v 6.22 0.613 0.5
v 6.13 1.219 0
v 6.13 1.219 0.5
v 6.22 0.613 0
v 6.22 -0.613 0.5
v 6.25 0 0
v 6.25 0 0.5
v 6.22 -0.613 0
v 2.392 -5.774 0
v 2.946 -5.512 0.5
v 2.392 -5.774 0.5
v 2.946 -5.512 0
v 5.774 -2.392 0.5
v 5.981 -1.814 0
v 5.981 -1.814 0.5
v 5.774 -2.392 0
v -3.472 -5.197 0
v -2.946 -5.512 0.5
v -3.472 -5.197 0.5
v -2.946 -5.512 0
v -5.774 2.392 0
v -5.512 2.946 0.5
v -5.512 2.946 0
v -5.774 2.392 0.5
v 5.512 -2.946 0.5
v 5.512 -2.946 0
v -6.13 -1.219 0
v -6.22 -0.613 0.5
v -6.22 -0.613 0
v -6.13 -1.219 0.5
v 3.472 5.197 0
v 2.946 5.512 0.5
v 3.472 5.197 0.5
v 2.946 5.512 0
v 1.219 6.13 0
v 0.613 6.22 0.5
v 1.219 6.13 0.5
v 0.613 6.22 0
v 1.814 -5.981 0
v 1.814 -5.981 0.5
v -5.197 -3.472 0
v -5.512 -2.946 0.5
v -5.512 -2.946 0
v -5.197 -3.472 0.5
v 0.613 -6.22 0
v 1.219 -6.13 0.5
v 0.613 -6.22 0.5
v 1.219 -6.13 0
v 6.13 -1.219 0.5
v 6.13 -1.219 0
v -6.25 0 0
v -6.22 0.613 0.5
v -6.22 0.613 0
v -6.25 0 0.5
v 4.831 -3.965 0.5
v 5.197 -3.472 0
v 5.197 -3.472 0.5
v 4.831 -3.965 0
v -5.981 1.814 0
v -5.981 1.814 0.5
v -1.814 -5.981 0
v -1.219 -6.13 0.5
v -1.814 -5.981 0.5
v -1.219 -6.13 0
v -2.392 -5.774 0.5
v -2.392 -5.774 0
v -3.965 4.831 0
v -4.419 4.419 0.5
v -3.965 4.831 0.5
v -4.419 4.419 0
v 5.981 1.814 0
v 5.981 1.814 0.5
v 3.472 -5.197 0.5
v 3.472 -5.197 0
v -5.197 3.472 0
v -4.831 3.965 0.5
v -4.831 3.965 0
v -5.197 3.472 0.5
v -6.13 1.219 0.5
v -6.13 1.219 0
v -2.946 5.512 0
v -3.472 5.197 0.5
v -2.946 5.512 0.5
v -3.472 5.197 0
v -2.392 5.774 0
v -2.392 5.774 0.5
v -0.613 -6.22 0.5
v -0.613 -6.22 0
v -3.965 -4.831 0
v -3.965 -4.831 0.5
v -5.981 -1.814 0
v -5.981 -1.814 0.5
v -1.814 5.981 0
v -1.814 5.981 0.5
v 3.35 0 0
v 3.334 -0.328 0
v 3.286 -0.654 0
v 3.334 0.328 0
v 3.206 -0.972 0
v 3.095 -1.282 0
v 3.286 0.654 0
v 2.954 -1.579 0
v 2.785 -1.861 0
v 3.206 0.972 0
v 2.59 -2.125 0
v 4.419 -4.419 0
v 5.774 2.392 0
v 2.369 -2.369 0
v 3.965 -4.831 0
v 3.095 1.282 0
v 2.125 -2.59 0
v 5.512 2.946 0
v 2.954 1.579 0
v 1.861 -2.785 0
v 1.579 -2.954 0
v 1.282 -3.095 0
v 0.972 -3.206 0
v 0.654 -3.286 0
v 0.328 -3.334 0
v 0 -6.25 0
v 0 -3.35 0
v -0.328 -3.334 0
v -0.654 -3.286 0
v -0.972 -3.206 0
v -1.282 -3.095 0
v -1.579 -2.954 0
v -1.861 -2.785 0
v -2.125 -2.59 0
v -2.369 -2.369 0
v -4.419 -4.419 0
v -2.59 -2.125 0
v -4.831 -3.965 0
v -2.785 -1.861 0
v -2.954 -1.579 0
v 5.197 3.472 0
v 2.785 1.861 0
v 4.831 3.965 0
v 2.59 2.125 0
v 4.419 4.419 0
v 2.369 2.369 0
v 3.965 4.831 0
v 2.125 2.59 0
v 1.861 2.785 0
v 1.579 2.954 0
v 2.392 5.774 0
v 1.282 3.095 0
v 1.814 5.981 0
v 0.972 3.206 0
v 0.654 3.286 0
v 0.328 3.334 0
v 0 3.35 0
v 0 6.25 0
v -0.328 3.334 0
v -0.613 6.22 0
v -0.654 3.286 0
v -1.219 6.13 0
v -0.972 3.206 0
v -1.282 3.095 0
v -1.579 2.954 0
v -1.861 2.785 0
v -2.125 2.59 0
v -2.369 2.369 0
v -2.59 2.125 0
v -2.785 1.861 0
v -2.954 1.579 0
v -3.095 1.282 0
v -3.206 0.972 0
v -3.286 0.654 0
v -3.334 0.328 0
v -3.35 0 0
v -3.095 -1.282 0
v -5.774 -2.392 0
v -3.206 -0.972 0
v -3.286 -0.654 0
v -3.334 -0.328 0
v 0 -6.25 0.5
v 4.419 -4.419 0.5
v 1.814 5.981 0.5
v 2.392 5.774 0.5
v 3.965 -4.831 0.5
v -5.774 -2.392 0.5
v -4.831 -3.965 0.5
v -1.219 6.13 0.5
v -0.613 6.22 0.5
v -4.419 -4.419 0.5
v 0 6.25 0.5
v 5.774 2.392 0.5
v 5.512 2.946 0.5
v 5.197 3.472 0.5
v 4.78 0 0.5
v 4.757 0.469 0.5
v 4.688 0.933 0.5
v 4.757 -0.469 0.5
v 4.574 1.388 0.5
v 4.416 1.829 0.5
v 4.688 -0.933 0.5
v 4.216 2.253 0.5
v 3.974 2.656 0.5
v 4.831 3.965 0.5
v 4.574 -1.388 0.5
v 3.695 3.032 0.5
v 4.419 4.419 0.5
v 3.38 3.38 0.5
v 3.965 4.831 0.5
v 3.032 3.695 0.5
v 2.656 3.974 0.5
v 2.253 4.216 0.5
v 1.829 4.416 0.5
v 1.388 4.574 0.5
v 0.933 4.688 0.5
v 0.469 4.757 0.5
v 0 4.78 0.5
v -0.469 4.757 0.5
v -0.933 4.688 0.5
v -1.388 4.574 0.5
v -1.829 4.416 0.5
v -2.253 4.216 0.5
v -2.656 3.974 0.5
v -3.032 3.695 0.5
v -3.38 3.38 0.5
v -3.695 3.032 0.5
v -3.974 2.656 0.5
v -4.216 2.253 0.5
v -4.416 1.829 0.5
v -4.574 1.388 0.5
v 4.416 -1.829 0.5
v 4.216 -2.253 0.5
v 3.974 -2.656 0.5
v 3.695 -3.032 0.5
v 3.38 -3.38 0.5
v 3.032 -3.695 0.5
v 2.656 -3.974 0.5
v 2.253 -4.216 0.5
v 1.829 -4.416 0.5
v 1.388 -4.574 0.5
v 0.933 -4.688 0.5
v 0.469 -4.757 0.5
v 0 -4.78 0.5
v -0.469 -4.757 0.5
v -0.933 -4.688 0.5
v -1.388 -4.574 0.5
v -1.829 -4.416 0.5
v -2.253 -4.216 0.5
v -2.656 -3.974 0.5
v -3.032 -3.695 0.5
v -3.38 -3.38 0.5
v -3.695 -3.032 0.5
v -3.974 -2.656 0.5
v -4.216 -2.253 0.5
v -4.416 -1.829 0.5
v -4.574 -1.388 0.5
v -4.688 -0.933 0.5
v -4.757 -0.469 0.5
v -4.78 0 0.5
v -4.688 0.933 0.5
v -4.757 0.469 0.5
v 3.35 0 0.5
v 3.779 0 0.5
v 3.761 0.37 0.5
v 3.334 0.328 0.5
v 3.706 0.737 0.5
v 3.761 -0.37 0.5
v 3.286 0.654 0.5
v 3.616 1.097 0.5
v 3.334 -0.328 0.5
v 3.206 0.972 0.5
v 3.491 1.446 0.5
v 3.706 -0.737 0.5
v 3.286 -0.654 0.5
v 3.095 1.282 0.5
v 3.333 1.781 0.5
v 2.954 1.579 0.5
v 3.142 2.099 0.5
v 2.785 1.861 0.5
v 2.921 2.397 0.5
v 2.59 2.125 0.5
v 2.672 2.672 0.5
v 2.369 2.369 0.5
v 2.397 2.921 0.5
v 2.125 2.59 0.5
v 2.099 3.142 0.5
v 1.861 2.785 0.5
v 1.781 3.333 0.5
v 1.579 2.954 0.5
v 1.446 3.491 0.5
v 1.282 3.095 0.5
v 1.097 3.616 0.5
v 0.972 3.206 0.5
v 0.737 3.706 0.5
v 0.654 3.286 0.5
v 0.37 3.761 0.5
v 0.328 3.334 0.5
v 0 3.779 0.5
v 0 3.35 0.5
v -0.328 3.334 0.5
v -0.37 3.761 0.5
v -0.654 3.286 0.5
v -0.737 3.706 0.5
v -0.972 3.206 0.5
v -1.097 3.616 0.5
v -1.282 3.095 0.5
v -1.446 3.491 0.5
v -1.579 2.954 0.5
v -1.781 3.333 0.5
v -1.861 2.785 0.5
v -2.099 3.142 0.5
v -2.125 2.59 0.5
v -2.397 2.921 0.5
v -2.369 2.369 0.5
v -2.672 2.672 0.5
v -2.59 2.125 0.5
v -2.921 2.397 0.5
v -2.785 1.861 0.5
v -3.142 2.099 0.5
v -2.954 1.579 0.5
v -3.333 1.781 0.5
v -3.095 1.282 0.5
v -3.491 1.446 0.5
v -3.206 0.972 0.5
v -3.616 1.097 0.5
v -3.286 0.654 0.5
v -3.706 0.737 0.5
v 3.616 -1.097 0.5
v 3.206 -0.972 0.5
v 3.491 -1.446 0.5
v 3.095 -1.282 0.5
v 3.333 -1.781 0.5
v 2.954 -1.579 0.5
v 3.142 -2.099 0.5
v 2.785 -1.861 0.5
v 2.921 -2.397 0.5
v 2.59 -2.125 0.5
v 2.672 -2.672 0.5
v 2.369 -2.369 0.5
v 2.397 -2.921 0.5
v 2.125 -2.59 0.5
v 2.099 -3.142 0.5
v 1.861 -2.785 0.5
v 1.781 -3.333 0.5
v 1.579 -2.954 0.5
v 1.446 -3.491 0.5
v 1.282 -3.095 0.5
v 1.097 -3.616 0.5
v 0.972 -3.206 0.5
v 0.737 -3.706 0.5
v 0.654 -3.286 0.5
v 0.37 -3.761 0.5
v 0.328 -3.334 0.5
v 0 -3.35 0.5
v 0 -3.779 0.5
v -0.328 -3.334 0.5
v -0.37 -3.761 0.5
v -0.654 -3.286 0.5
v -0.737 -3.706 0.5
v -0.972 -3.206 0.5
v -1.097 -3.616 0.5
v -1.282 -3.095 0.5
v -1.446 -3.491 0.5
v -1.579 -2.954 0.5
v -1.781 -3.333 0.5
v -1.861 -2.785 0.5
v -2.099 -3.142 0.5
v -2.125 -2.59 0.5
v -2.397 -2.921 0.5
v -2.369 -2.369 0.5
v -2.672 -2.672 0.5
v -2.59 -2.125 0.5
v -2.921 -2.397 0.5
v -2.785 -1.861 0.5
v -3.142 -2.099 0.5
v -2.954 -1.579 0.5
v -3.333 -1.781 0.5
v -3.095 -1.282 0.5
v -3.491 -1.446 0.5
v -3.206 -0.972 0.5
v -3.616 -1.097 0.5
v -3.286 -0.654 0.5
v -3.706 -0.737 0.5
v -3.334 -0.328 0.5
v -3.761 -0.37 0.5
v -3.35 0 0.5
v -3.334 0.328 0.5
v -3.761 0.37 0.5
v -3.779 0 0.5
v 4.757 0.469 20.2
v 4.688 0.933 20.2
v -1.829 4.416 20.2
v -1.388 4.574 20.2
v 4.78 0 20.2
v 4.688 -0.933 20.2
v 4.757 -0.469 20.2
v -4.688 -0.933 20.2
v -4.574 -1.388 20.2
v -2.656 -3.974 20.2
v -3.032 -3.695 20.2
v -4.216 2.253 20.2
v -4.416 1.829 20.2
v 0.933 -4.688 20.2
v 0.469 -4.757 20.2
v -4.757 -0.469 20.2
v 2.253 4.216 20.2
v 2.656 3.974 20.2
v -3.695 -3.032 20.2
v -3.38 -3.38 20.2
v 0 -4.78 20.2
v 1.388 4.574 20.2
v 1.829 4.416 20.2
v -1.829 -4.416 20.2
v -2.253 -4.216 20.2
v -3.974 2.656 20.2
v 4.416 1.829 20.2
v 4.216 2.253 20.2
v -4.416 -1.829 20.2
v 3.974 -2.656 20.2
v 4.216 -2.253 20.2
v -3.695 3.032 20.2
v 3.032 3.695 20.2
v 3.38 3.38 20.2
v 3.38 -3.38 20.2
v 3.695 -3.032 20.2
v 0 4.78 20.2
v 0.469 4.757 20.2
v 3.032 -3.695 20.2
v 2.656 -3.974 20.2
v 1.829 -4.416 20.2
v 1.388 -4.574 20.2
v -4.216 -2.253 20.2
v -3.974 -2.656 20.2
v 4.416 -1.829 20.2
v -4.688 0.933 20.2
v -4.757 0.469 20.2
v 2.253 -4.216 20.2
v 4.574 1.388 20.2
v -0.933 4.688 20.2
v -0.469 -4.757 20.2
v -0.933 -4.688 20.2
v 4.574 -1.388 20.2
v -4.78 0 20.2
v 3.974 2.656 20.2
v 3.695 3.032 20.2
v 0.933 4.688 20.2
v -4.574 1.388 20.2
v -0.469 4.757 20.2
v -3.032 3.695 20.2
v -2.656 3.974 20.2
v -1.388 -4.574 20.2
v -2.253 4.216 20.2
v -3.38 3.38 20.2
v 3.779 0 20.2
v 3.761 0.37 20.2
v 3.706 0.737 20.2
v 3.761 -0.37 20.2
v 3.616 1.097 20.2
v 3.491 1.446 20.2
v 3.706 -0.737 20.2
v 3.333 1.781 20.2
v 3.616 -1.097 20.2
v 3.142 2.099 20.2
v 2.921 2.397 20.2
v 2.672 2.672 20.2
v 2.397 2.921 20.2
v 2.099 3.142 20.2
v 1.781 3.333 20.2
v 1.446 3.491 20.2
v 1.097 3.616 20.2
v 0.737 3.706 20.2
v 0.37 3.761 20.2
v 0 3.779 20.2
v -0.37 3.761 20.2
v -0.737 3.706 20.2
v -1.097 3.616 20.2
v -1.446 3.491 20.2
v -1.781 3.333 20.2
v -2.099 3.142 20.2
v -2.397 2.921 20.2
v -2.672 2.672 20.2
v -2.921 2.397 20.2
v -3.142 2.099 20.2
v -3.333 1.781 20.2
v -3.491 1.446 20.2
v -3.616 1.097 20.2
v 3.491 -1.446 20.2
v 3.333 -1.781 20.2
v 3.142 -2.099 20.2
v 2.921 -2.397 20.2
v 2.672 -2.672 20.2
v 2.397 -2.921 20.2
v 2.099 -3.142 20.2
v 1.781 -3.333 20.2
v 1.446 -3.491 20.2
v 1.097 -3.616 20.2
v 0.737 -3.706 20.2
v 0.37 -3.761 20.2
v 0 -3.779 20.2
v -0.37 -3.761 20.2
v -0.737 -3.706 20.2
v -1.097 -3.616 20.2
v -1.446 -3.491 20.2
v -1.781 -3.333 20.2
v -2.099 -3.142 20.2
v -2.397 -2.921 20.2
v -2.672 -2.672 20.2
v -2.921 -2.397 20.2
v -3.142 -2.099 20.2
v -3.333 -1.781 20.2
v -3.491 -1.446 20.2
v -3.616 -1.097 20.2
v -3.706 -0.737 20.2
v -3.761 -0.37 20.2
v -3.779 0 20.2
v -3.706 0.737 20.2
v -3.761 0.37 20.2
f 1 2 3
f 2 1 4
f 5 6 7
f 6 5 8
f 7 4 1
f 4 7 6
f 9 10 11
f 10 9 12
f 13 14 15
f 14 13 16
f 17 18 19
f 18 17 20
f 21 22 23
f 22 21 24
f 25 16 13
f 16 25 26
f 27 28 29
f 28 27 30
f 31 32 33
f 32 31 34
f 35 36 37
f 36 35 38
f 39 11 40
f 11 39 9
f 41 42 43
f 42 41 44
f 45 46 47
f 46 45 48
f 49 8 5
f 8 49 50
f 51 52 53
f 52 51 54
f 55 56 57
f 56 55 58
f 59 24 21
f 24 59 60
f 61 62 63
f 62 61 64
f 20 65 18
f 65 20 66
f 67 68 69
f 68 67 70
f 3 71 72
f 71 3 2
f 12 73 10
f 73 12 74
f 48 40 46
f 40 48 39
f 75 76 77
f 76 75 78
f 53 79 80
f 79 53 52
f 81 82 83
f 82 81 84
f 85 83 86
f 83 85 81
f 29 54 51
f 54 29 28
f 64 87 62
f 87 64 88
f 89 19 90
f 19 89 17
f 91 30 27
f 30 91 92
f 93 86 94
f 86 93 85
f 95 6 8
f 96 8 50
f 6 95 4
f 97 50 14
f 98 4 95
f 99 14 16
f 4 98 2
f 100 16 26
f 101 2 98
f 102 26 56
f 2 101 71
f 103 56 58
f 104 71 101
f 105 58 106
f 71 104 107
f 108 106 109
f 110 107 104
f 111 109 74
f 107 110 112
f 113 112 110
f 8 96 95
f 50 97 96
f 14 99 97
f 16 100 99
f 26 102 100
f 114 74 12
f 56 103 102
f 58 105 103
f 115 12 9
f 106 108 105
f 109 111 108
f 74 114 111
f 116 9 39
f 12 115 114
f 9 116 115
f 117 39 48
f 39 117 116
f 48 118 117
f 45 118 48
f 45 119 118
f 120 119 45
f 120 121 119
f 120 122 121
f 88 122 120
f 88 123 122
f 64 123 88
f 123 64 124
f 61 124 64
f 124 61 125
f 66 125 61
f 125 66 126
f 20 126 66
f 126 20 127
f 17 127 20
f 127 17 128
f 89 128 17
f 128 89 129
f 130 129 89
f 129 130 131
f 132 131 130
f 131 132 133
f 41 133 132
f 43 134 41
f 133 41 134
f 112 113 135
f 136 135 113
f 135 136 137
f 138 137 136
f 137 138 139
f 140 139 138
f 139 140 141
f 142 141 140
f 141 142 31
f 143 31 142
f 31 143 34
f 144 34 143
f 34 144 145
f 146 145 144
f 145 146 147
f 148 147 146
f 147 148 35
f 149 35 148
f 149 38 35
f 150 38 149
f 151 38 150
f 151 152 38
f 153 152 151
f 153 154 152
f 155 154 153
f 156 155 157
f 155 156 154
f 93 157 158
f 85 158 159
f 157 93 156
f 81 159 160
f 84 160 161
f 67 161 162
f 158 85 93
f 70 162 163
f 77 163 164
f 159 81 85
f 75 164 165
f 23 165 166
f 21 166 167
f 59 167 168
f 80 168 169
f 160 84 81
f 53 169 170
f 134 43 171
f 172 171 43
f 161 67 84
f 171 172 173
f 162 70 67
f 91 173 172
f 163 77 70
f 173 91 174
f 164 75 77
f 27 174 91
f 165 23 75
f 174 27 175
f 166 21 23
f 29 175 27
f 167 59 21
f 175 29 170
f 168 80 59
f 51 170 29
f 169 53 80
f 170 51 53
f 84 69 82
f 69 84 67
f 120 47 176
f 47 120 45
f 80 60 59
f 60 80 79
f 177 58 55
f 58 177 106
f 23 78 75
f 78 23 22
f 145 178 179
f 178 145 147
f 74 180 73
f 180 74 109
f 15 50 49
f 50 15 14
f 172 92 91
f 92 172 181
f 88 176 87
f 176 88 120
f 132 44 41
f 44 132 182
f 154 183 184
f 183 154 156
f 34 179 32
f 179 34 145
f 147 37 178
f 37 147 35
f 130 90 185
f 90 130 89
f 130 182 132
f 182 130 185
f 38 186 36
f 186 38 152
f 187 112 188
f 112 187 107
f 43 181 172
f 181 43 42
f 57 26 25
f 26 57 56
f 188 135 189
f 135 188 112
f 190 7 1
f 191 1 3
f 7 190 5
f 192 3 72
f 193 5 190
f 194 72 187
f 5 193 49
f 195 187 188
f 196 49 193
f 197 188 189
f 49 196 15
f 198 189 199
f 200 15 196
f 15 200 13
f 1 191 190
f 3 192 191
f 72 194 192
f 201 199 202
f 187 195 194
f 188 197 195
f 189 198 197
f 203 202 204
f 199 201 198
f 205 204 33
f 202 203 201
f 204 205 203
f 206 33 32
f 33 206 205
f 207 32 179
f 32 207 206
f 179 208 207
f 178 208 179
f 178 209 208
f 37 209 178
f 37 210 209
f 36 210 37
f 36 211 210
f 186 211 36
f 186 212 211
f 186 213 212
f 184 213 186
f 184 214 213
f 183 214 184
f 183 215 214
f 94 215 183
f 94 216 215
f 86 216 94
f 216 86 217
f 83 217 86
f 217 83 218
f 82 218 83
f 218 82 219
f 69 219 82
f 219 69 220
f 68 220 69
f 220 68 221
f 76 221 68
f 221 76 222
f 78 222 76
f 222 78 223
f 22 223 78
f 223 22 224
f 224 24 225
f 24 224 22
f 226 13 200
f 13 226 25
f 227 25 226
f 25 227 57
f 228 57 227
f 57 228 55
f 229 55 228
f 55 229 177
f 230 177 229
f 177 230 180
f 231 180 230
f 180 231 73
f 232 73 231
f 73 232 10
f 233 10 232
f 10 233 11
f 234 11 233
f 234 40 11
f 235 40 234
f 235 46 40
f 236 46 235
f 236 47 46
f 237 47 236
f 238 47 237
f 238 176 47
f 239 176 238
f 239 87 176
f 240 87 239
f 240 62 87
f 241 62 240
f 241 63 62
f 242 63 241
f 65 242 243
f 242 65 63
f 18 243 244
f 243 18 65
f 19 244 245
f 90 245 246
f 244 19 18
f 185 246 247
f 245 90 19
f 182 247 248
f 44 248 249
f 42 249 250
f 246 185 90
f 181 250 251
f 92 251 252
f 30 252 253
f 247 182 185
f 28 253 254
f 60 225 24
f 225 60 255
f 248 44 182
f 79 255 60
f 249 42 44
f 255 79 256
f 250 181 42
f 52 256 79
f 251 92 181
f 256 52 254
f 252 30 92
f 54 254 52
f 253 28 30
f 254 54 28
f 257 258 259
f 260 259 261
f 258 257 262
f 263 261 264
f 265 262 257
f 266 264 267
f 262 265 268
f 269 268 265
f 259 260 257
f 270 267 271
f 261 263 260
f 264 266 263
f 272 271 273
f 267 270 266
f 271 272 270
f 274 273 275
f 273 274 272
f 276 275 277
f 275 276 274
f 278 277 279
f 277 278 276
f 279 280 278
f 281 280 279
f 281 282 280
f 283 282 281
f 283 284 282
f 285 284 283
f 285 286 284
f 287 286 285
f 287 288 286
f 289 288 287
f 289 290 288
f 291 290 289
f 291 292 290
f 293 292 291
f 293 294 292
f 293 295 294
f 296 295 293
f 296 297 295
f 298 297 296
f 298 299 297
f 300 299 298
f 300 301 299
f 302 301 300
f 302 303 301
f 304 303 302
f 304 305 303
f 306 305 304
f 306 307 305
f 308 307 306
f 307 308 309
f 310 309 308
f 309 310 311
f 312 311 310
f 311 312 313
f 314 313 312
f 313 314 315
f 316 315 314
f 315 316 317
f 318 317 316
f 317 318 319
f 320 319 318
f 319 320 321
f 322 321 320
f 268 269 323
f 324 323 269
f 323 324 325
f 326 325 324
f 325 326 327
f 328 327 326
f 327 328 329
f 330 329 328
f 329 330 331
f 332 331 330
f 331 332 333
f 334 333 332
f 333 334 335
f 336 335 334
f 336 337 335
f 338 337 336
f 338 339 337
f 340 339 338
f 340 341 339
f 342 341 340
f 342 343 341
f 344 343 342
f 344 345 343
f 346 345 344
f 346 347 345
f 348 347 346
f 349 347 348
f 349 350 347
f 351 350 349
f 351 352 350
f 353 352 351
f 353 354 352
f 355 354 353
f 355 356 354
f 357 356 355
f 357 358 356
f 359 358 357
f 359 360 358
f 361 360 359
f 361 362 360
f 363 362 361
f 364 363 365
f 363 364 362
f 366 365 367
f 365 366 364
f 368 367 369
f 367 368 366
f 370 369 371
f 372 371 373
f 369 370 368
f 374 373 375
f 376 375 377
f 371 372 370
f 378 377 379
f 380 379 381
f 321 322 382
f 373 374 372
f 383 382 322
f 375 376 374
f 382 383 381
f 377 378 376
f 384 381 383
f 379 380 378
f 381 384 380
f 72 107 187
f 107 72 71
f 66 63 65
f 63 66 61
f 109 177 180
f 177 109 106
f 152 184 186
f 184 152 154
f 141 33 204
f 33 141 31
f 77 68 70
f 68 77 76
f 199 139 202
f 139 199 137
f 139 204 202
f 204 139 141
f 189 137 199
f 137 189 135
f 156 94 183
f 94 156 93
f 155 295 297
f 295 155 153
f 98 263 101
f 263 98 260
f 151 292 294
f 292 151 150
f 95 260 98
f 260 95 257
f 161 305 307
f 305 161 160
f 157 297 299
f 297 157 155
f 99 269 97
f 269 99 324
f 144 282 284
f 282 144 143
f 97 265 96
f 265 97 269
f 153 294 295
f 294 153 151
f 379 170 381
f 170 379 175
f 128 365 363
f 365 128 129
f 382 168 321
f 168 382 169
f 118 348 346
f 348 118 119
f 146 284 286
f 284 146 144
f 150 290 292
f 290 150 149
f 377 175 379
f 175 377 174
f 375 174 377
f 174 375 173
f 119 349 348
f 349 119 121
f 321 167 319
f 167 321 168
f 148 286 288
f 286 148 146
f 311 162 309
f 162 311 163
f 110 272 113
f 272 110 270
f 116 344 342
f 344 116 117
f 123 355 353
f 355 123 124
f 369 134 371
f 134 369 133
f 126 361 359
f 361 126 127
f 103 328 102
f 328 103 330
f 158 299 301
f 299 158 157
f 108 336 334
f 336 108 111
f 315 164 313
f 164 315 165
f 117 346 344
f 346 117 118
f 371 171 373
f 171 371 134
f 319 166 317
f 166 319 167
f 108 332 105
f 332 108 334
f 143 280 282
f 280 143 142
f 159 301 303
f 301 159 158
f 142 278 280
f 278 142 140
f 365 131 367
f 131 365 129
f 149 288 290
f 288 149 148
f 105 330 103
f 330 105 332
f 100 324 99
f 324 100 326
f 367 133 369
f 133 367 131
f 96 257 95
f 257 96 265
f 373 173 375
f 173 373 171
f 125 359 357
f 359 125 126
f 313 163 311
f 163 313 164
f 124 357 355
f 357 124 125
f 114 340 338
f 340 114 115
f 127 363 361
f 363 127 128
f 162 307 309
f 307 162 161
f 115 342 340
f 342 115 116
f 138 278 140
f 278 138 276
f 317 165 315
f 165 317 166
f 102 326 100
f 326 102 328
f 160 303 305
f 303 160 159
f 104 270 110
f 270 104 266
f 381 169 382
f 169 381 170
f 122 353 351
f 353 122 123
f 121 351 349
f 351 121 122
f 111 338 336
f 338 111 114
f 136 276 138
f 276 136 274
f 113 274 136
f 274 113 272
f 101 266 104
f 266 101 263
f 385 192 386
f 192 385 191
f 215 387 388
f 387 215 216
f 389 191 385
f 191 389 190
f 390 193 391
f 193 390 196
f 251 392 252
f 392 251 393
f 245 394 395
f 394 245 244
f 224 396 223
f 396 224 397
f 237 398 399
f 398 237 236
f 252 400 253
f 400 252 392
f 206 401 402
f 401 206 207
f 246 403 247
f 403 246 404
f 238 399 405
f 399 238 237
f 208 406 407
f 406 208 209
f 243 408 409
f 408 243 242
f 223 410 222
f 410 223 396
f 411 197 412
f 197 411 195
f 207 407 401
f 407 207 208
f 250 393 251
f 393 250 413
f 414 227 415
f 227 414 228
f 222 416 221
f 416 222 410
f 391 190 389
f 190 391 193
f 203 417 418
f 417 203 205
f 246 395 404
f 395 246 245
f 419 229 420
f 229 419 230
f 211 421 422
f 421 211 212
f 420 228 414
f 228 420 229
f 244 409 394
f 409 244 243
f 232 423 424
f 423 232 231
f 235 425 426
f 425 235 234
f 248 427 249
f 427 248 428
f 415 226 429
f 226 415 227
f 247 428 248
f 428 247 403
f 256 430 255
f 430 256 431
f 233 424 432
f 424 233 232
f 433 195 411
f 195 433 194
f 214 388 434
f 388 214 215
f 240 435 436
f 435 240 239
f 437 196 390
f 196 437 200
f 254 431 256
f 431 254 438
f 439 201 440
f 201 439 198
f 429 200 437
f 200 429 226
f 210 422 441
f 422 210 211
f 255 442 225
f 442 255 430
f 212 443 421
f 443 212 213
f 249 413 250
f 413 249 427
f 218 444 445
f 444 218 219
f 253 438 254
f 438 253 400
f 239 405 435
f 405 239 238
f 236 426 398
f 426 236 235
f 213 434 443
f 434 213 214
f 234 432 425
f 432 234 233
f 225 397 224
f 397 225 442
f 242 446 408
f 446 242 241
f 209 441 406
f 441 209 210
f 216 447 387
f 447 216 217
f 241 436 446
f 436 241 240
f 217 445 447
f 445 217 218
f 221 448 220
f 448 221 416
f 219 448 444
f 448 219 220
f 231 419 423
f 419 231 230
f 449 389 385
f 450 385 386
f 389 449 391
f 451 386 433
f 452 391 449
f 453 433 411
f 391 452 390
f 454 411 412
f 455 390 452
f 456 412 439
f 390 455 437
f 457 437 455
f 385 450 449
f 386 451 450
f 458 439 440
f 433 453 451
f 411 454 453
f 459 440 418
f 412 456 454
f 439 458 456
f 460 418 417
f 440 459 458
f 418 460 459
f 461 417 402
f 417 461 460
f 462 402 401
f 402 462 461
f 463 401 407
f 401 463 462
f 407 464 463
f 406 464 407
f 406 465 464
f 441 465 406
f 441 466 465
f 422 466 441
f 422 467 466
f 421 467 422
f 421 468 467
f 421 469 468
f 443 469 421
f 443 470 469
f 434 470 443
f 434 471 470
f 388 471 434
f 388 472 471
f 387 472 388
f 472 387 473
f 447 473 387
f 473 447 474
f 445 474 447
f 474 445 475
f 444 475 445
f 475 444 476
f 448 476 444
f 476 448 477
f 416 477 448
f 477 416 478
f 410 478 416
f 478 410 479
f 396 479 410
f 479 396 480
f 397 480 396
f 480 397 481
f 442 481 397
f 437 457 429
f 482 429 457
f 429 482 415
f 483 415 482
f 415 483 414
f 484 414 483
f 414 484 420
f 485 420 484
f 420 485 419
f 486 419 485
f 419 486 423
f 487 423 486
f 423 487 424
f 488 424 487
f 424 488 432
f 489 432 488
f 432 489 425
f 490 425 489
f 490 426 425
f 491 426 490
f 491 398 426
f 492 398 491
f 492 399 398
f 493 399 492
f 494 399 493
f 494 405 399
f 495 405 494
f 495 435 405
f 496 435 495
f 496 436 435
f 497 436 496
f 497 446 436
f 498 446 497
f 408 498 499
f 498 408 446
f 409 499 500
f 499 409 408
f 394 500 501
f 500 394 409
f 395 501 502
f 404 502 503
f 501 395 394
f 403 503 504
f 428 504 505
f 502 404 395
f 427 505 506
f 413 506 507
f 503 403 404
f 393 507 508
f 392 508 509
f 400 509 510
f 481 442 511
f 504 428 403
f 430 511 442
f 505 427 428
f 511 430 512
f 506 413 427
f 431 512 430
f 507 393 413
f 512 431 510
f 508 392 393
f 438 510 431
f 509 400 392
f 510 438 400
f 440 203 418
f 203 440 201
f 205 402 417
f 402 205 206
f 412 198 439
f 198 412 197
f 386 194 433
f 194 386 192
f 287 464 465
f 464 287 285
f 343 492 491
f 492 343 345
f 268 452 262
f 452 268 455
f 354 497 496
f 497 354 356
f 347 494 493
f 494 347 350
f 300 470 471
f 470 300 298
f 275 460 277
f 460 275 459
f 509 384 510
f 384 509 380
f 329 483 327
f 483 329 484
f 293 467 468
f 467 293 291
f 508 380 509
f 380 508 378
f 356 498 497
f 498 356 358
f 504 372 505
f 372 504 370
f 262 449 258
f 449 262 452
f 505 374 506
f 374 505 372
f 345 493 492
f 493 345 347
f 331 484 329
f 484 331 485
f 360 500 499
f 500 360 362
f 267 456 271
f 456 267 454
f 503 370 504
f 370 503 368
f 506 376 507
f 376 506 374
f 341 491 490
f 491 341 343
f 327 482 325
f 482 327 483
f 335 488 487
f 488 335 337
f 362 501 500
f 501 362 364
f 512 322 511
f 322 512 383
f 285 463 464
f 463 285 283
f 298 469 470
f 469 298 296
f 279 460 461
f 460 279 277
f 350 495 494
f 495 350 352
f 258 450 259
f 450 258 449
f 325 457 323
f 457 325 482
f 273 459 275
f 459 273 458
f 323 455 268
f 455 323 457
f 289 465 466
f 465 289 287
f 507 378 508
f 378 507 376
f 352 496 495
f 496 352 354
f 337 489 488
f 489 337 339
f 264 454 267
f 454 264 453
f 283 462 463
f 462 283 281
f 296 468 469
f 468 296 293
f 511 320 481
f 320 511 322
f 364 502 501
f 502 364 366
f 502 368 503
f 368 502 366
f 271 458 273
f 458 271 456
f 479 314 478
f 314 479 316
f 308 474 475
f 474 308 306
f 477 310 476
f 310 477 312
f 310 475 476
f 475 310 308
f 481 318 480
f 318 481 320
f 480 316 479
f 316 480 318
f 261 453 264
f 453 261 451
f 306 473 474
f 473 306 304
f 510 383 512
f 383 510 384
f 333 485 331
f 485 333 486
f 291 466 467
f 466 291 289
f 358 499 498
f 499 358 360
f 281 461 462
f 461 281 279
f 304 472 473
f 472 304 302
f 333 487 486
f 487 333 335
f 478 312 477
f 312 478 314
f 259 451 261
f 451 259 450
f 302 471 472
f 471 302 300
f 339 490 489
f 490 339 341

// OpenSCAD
// 3D Printer Cutter Attachment
// Uses a bearing to venter the cutting tip of the blade
// as the 3D printer moves.

$fn = 64;
blade_len = 11.4; // Base to tip of blade distance
blade_rad = 3.2/2.0; // Radius of cutting blade
blade_angle = 11.5;
blade_holder_lip_len = 0.5;
backstop_len = 1.0; // How much of a backstop the insert
                    // in the bearing has. The blade will
                    // stick out this far:
                    // blade_len - bearing_h + backstop_len

bearing_inner_rad = 9.6/2.0; // Inner circle of bearing
bearing_inner_ring_rad = 12.5/2.0;
bearing_outer_rad = 22.2/2.0; // Outer circle of bearing
bearing_outer_ring_rad = 24.5/2.0;
bearing_outer_ring_h = 1.4;
bearing_h = 7.1;

spring_len = 14.3;
piston_len = 5.0;
cap_len = 2.0;
cylinder_len = spring_len + piston_len;

bearing_block_len = bearing_outer_rad*2.0 + 5.0;
bearing_block_connector_wid = 6.0;

// Ender 3 Pro mounting params
screw_hole_dist=14.4;
screw_hole_dia=3.0;
screw_hole_rad=screw_hole_dia/2;
screw_len = 20;
hotend_vert_dist = 50.0; // (Vertical) Distance from the screwholes to the hotend location
hotend_horiz_dist = 12.0/2.0; // (Horizontal) Distance from screw holes to center of hotend location

gap_size = 0.02;

// The top-down blade
module blade2D() {
    circle(blade_rad+gap_size);
}

// What holds the cutter inside of the bearing
module blade_holder2D() {
    circle(bearing_inner_rad-gap_size);
}

// The block that holds onto the bearing
module bearing_block2D() {
    difference() {
        union() {
        translate([0,bearing_block_len/4.0])
        square([bearing_block_len, bearing_block_len/2.0], center=true);
        circle(bearing_block_len/2.0);
        }
        circle(bearing_outer_rad+gap_size);
    }
}

//bearing_block2D();
//blade_holder2D();

piston_gap_size = 1.1;
module blade_insert3D() {
    difference() {
    translate([0,0,blade_holder_lip_len+0.3])
    linear_extrude(piston_len-blade_holder_lip_len)
    offset(-piston_gap_size-0.06) blade_holder2D();
    translate([1.8*blade_rad+0.2, 0, -blade_rad*4.8])
    rotate([0,blade_angle,180])
    linear_extrude(blade_len)
    blade2D();
    }
}

//blade_insert3D();

module blade_holder3D() {
    // TODO: Add emerging screw holes for a screw-on
    //       cap!
    
    difference() {
    linear_extrude(blade_holder_lip_len)
    circle(bearing_inner_ring_rad);
    linear_extrude(blade_holder_lip_len)
    circle(bearing_inner_rad-(bearing_inner_ring_rad-bearing_inner_rad));
    }
    
    difference() {
    union() {
    translate([0,0,blade_holder_lip_len])
    linear_extrude(cylinder_len+0.4)
    blade_holder2D();
    linear_extrude(blade_holder_lip_len)
    circle(bearing_inner_ring_rad);
    }
    //translate([0,0,4])
    linear_extrude(cylinder_len+4)
    offset(-1.0) blade_holder2D();
    //translate([1.8*blade_rad+0.2, 0, -blade_rad/4.0])
    //rotate([0,blade_angle,180])
    //linear_extrude(blade_len)
    //blade2D();
    }
    //blade_insert3D();
    //translate([0,0,bearing_h-backstop_len])
    //linear_extrude(backstop_len)
    //circle(bearing_inner_rad-gap_size);
}

module screw_holes(extra_wid=0.0, extra_len=0.0) {
    translate([0, screw_len/2, 0])
    rotate([90,0,0]) {
        translate([(screw_hole_dist+extra_wid)/2,0,0])
        cylinder(r=screw_hole_rad, h=screw_len+extra_len);
        translate([-(screw_hole_dist+extra_wid)/2,0,0])
        cylinder(r=screw_hole_rad, h=screw_len+extra_len);
    }
}

module bearing_block3D() {
    linear_extrude(bearing_h-bearing_outer_ring_h)
    bearing_block2D();
}

support_triangle_wid = bearing_block_len/2-(bearing_outer_rad+gap_size);
module support_triangle() {
    rotate([0,-90,0])
    linear_extrude(support_triangle_wid)
    polygon([[0, 0], [0, bearing_block_len/2], [hotend_vert_dist-bearing_h*2+bearing_outer_ring_h, bearing_block_len/2]]);
}

module bearing_block_connector3D() {
    difference() {
    union() {
    translate([0, bearing_block_len/2.0+bearing_block_connector_wid/2, (hotend_vert_dist-bearing_h)/2])
    cube([bearing_block_len, bearing_block_connector_wid, hotend_vert_dist-bearing_h], center=true);
    translate([bearing_block_len/2,0,bearing_h-bearing_outer_ring_h])
    support_triangle();
    translate([-bearing_block_len/2+support_triangle_wid,0,bearing_h-bearing_outer_ring_h])
    support_triangle();
    }
    translate([0, bearing_block_len/2.0+bearing_block_connector_wid/2, hotend_vert_dist-bearing_h-4])
    screw_holes();
    }
}


// TODO: Incorporate spring into blade holder!
//difference() {
blade_holder3D();
//cube(500);
//}
//#cube([9.3, 1.0, 1.0], center=true);
//difference() {
//union() {
//bearing_block3D();
//bearing_block_connector3D();
//}
//translate([0,13,bearing_h/2-screw_hole_rad/2])
//screw_holes(extra_wid=6.0, extra_len=-5.0);
//}
